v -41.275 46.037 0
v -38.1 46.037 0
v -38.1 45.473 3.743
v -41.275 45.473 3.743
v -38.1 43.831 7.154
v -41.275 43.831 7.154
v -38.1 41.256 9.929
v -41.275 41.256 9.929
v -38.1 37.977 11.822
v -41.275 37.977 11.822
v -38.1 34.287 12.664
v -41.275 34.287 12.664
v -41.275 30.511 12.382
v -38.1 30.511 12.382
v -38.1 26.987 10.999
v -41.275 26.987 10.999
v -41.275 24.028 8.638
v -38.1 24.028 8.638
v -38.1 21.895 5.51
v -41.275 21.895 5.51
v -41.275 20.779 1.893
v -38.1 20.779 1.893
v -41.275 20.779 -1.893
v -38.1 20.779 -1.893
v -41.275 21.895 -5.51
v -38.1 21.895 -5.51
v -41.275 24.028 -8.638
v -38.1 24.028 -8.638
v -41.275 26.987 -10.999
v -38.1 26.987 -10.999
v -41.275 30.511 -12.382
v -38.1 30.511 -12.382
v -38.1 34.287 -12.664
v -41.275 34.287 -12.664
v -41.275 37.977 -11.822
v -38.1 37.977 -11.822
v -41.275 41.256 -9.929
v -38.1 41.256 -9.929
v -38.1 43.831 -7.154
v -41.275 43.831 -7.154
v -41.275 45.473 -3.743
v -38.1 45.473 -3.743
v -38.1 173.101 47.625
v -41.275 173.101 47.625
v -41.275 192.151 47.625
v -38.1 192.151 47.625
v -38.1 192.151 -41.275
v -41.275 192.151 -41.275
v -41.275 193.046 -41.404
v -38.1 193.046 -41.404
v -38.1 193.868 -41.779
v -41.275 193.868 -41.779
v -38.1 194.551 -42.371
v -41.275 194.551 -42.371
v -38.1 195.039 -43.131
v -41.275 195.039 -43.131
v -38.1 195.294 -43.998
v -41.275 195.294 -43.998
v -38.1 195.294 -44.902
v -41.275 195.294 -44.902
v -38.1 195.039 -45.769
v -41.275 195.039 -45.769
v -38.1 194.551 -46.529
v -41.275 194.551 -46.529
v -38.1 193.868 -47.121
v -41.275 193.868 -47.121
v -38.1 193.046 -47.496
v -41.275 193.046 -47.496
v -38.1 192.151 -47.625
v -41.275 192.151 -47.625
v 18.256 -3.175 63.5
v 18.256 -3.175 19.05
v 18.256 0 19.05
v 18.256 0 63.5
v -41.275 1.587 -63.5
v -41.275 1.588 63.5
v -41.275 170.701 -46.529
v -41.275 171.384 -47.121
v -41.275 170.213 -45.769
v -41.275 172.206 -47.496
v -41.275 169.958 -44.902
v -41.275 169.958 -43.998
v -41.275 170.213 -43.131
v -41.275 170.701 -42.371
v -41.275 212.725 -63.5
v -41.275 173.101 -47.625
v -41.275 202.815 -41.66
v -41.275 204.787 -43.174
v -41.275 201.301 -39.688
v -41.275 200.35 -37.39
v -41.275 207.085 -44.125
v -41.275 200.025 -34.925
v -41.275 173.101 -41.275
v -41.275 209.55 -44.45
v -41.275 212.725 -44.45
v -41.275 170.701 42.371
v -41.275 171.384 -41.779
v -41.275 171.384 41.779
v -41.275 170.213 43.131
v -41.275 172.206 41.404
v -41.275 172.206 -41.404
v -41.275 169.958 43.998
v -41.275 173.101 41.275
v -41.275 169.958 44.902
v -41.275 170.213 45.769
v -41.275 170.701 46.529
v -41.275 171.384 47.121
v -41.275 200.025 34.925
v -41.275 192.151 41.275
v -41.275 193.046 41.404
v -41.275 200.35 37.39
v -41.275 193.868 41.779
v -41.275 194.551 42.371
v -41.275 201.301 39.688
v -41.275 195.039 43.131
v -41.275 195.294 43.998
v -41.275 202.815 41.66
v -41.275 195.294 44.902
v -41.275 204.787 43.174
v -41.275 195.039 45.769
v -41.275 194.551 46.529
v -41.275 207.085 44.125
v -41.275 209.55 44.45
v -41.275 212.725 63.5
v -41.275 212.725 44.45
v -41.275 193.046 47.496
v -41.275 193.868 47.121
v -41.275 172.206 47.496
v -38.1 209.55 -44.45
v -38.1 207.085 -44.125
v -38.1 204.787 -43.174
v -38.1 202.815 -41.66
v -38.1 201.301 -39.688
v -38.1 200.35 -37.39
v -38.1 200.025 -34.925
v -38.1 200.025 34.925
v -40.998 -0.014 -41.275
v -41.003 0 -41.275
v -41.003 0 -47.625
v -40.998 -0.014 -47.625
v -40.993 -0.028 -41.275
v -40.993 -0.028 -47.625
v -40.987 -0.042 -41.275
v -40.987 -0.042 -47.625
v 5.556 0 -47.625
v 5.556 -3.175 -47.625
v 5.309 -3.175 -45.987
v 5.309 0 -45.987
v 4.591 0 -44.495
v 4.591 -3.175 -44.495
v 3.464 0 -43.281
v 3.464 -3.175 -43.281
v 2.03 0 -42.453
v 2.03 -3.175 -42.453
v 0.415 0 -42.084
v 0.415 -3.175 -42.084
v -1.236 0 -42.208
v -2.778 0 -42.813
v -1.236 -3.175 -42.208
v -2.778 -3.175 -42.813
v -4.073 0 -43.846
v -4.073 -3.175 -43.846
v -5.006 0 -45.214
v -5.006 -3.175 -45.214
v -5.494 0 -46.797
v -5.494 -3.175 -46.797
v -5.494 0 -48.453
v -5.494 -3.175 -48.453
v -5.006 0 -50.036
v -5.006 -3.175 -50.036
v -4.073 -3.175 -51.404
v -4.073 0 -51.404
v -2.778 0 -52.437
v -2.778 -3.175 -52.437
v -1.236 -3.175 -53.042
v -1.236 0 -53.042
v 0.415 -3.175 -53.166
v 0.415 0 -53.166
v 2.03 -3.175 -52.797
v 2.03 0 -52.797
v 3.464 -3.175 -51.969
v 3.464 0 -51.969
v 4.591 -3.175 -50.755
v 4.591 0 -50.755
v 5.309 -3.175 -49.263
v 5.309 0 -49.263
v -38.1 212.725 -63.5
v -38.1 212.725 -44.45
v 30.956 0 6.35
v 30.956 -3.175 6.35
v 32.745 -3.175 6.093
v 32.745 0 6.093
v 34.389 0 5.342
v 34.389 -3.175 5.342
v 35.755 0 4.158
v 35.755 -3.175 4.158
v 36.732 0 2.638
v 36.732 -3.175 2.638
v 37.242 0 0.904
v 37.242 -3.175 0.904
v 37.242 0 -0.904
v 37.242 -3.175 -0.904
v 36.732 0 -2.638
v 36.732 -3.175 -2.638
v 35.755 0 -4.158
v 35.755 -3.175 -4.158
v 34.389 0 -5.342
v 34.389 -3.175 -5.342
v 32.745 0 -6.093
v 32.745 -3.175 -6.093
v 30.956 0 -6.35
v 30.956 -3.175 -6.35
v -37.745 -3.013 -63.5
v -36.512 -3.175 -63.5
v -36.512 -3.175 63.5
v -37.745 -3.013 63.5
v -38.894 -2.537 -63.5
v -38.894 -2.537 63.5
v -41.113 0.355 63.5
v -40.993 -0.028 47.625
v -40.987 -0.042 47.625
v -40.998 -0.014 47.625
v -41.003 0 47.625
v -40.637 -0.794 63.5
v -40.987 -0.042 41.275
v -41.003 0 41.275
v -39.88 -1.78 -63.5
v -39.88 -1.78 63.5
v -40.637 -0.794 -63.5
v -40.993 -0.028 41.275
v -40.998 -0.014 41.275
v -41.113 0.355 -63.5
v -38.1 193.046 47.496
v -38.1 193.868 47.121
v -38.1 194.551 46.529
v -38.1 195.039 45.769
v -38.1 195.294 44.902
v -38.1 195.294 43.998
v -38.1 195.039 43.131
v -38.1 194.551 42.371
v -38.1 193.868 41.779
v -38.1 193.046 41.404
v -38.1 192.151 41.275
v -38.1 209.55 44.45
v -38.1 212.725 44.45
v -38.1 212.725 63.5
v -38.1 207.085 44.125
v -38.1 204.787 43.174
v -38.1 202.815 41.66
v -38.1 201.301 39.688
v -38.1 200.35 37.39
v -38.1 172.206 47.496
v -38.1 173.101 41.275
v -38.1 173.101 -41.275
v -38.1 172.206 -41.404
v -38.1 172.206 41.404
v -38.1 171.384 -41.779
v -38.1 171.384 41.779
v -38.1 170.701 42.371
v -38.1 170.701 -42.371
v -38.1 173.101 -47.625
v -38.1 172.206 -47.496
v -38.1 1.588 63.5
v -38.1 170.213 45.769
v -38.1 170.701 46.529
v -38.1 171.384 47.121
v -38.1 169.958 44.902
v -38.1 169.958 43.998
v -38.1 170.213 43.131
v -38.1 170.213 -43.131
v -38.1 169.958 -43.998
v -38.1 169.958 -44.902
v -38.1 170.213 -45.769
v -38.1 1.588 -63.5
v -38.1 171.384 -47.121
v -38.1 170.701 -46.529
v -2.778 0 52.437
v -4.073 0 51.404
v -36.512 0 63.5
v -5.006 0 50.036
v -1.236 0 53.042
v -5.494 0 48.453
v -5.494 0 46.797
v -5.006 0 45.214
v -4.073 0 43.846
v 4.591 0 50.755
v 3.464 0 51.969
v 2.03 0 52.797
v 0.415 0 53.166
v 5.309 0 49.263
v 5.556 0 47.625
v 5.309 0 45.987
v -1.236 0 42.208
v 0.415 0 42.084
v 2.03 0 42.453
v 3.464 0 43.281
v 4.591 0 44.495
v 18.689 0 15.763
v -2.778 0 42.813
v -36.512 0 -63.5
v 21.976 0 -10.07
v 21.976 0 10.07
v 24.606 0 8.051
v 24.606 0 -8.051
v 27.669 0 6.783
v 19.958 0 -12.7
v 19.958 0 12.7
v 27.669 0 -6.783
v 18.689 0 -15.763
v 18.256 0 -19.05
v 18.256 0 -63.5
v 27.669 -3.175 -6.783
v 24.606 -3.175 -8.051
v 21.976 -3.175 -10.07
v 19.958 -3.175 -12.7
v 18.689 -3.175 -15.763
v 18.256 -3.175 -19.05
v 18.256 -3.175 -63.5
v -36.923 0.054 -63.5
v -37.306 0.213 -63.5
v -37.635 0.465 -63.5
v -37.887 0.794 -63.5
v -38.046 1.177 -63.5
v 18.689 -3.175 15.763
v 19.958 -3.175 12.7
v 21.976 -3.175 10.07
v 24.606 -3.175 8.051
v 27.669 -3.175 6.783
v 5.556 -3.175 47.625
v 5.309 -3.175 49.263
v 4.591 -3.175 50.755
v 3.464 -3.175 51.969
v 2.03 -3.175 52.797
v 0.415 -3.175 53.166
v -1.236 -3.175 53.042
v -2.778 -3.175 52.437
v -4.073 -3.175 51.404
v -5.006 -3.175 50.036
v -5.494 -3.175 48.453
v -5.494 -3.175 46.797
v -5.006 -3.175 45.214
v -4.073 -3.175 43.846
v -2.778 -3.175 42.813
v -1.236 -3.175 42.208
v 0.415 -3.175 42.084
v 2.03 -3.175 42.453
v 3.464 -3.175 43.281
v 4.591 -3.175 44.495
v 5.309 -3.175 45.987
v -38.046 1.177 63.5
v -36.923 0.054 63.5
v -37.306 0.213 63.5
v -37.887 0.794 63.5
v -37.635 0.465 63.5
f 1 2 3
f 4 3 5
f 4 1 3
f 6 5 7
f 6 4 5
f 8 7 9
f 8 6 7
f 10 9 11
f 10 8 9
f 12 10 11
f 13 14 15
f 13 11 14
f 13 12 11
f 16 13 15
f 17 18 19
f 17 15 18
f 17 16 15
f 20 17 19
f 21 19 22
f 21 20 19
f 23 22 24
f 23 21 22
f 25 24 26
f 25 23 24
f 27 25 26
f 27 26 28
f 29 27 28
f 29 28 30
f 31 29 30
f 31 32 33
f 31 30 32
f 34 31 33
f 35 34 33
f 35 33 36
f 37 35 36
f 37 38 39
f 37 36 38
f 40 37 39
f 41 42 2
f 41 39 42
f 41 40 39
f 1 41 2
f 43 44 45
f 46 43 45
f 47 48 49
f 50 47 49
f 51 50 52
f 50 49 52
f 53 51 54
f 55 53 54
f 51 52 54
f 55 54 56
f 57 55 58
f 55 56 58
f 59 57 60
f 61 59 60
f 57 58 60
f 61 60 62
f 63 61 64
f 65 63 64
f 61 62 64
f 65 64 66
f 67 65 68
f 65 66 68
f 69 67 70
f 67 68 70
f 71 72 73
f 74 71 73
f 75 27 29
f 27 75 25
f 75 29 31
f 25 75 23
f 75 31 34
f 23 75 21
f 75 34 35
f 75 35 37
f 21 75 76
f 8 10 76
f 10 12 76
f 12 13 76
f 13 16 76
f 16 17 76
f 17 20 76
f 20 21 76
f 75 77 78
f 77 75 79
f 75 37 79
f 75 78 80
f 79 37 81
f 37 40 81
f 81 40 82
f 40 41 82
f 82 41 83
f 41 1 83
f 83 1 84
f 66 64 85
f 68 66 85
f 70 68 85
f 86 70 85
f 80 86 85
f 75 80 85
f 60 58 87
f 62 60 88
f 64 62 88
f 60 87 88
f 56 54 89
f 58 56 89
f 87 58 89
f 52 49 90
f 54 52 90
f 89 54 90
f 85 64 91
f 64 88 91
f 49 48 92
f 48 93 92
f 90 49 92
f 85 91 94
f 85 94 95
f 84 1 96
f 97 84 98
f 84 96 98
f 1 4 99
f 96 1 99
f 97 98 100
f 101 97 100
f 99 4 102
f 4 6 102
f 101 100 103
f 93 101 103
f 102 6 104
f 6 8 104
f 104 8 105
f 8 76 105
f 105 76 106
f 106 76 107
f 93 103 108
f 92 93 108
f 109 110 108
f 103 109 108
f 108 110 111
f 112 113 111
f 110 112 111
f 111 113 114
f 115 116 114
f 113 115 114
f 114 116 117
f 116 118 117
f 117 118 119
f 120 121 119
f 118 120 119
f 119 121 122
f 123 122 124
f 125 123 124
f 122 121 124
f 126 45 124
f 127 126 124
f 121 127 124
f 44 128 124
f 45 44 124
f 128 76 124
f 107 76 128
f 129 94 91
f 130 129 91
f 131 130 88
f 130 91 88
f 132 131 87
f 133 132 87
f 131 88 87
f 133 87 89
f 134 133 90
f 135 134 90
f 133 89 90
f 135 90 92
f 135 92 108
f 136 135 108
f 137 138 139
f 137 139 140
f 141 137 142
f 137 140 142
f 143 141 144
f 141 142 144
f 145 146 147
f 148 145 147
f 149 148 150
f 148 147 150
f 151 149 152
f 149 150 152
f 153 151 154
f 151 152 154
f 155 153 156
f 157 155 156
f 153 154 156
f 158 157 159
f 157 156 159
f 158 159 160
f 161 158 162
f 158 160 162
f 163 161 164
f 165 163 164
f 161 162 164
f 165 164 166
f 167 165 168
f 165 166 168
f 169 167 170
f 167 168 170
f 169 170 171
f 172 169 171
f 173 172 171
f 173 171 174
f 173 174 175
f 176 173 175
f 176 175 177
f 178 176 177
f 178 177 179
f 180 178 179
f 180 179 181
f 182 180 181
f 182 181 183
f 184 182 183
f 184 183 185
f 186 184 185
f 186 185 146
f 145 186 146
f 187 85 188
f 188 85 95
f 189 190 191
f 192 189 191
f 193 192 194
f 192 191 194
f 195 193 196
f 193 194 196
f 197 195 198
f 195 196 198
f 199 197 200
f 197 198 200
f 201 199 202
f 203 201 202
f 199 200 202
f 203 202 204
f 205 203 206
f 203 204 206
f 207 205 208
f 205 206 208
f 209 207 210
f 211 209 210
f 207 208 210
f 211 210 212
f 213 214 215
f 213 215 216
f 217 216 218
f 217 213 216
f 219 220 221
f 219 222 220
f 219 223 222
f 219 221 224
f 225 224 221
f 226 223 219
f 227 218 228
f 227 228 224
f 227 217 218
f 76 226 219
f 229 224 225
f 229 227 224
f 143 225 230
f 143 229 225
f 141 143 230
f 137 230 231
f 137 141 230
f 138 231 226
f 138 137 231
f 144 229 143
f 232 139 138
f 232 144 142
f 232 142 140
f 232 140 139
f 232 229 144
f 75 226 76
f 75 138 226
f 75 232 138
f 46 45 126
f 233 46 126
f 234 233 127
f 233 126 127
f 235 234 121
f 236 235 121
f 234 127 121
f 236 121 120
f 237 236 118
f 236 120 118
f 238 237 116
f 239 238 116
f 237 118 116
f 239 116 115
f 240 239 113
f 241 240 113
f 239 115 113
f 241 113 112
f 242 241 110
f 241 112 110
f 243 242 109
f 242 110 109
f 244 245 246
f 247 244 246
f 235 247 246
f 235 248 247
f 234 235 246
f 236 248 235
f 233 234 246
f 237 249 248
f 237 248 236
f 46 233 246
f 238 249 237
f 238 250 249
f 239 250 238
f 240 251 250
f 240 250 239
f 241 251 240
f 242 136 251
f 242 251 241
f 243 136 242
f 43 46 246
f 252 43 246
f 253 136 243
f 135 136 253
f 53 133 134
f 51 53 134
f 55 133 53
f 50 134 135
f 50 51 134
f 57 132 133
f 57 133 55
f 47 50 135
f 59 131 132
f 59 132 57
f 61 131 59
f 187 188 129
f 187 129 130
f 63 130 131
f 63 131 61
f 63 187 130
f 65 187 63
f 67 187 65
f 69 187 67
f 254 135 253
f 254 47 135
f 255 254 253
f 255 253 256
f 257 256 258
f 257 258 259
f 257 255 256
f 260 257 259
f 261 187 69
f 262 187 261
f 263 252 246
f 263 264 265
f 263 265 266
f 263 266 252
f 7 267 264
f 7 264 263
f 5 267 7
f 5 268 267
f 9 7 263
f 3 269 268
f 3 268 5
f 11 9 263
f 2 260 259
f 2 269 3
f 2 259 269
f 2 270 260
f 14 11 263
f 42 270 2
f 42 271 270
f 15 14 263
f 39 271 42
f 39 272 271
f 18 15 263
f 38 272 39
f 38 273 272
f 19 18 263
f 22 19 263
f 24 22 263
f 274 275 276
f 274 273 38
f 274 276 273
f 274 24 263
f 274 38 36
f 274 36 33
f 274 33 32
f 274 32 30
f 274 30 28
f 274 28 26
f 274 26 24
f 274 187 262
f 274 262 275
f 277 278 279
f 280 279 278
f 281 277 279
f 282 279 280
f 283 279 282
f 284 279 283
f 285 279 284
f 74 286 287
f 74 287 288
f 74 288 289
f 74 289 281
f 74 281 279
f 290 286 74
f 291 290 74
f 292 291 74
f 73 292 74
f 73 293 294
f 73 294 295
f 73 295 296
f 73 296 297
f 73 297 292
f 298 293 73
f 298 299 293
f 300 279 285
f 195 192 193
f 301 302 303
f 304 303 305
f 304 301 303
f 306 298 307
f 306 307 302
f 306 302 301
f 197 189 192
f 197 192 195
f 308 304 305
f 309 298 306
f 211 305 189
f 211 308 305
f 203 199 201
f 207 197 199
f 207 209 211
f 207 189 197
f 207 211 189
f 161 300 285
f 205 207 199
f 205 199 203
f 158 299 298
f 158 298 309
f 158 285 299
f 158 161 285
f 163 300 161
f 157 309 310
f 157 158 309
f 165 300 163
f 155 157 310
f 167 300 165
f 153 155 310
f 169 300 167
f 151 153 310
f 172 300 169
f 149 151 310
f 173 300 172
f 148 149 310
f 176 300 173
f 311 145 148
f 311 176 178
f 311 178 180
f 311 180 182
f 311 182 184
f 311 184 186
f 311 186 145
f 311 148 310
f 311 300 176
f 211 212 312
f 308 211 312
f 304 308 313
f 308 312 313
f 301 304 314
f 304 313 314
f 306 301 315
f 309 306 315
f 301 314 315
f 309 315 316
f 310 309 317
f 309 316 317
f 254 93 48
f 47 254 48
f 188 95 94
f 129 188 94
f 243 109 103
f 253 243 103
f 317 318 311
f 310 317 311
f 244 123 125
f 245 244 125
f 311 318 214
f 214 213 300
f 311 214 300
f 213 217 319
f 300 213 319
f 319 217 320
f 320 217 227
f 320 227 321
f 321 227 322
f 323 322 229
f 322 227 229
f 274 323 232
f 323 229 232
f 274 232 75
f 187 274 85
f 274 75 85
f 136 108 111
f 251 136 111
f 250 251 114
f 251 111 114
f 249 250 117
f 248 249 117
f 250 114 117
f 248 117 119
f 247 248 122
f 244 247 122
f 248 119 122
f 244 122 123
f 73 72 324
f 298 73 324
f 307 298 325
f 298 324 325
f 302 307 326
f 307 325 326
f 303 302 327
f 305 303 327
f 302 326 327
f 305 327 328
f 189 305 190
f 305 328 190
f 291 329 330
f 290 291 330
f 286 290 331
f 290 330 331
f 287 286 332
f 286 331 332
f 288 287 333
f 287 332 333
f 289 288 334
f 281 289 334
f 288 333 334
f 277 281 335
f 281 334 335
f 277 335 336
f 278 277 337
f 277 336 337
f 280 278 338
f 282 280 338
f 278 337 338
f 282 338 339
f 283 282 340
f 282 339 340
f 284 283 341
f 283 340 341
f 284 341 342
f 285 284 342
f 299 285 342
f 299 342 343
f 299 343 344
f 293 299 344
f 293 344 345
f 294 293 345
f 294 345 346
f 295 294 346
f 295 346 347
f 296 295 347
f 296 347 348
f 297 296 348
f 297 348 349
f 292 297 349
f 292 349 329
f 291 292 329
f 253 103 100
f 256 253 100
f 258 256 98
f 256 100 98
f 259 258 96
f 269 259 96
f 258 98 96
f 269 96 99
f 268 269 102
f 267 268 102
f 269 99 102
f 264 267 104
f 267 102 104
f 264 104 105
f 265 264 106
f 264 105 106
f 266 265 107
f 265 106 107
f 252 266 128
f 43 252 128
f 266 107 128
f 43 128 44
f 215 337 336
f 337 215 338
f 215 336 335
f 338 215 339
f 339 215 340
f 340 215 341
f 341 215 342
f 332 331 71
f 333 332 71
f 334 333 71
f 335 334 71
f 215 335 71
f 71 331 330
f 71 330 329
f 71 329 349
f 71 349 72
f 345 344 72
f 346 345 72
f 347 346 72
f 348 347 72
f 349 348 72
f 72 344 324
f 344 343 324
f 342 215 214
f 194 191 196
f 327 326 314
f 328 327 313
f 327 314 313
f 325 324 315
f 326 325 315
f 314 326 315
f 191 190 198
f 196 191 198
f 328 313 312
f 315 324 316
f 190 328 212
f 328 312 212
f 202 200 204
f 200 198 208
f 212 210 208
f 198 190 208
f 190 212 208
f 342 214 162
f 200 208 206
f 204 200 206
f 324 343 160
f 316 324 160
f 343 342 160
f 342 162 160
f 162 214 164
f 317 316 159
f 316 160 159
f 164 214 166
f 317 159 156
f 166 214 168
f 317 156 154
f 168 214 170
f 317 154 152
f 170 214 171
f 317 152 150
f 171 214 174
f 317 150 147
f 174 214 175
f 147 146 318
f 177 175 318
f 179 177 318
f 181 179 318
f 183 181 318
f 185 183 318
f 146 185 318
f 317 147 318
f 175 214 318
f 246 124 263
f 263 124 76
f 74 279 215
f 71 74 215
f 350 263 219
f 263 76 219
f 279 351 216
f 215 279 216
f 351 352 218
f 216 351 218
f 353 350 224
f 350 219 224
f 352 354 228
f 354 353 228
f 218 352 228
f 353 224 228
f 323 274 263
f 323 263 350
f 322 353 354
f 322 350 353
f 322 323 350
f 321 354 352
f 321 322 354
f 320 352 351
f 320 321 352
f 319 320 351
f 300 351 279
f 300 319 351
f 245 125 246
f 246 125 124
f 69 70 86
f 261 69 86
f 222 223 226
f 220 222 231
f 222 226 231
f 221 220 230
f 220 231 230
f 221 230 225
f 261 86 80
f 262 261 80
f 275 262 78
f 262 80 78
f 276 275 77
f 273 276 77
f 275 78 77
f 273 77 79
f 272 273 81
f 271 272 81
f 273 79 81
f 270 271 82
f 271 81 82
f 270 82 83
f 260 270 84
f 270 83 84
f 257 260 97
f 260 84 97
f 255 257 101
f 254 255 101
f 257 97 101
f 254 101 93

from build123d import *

# Parameters (mm, degrees)
EXTRUDE1_DEPTH             = 63.5
EXTRUDE1_DEPTH_BACK        = 63.5
CUT_EXTRUDE2_REACH         = 230.798
SKETCH2_R                  = 5.55625
EXTRUDE2_DEPTH             = 3.175
CUT_EXTRUDE3_REACH         = 237.498
SKETCH4_R                  = 12.7
CUT_EXTRUDE4_DEPTH         = 236.497746224
FILLET1_R                  = 9.525
CUT_EXTRUDE7_REACH         = 237.498
FLATTEN_BENDS1_OUTLINE_W   = 4.987278338
FLATTEN_BENDS1_OUTLINE_H   = 127
FLATTEN_BENDS1_DEPTH       = 212.725
FLATTEN_BENDS1_START       = -3.175
FLATTEN_BENDS1_2_OUTLINE_R = 12.7
FLATTEN_BENDS1_2_DEPTH     = 3.175
PROCESS_BENDS1_START       = -252.637278338
PROCESS_BENDS1_OUTLINE_W   = 3.175
PROCESS_BENDS1_OUTLINE_H   = 127
PROCESS_BENDS1_DEPTH       = 211.622562692
PROCESS_BENDS1_START_2     = -41.275
PROCESS_BENDS1_2_OUTLINE_W = 3.175
PROCESS_BENDS1_2_OUTLINE_H = 6.35
PROCESS_BENDS1_2_DEPTH     = 0.287614639
PROCESS_BENDS1_START_3     = -40.987385361
PROCESS_BENDS1_3_OUTLINE_R = 12.7
PROCESS_BENDS1_3_DEPTH     = 2.887385361
PROCESS_BENDS1_4_OUTLINE_R = 12.7
PROCESS_BENDS1_4_DEPTH     = 4.7625
PROCESS_BENDS1_START_4     = -64
PROCESS_BENDS1_5_DEPTH     = 128
PROCESS_BENDS1_START_5     = -47.625
PROCESS_BENDS1_6_DEPTH     = 95.25


with BuildPart() as part:
    # Sketch1 → Extrude1 (new, two sides: drawn at the far end of the back side and taken through both)
    with BuildSketch(Plane.XY.offset(-EXTRUDE1_DEPTH_BACK)):
        with BuildLine():
            Line((18.25625, 0), (-36.5125, 0))
            ThreePointArc((-36.5125, 0), (-37.635032015, 0.464967985), (-38.1, 1.5875))
            Line((-38.1, 1.5875), (-38.1, 212.725))
            Line((-38.1, 212.725), (-41.275, 212.725))
            Line((-41.275, 212.725), (-41.275, 1.5875))
            ThreePointArc((-41.275, 1.5875), (-39.880096045, -1.780096045), (-36.5125, -3.175))
            Line((-36.5125, -3.175), (18.25625, -3.175))
            Line((18.25625, -3.175), (18.25625, 0))
        make_face()
    extrude(amount=EXTRUDE1_DEPTH + EXTRUDE1_DEPTH_BACK)

    # Sketch2 → Cut-Extrude2 (cut, up to next)
    with BuildSketch(Plane.XZ.offset(3.175), mode=Mode.PRIVATE) as cut_extrude2_sk1:
        with Locations((0, -47.625)):
            Circle(SKETCH2_R)
    cut_extrude2_tool1 = extrude(cut_extrude2_sk1.sketch, amount=-CUT_EXTRUDE2_REACH, mode=Mode.PRIVATE) & part.part
    # Sketch2 → Cut-Extrude2 (cut, up to next)
    with BuildSketch(Plane.XZ.offset(3.175), mode=Mode.PRIVATE) as cut_extrude2_sk2:
        with Locations((0, 47.625)):
            Circle(SKETCH2_R)
    cut_extrude2_tool2 = extrude(cut_extrude2_sk2.sketch, amount=-CUT_EXTRUDE2_REACH, mode=Mode.PRIVATE) & part.part
    add(cut_extrude2_tool1.solids().sort_by_distance((0, -3.175, -47.625))[0], mode=Mode.SUBTRACT)
    add(cut_extrude2_tool2.solids().sort_by_distance((0, -3.175, 47.625))[0], mode=Mode.SUBTRACT)

    # Sketch3 → Extrude2 (add)
    with BuildSketch(Plane.XZ.offset(3.175)):
        with BuildLine():
            Line((18.25625, -19.05), (18.25625, 19.05))
            ThreePointArc((18.25625, 19.05), (21.975993879, 10.069743879), (30.95625, 6.35))
            ThreePointArc((30.95625, 6.35), (37.30625, 0), (30.95625, -6.35))
            ThreePointArc((30.95625, -6.35), (21.975993879, -10.069743879), (18.25625, -19.05))
        make_face()
    extrude(amount=-EXTRUDE2_DEPTH)

    # Sketch4 → Cut-Extrude3 (cut, up to next)
    with BuildSketch(Plane.ZY.offset(41.275), mode=Mode.PRIVATE) as cut_extrude3_sk1:
        with Locations((0, 33.3375)):
            Circle(SKETCH4_R)
    cut_extrude3_tool1 = extrude(cut_extrude3_sk1.sketch, amount=-CUT_EXTRUDE3_REACH, mode=Mode.PRIVATE) & part.part
    add(cut_extrude3_tool1.solids().sort_by_distance((-41.275, 33.3375, 0))[0], mode=Mode.SUBTRACT)

    # Sketch5 → Cut-Extrude4 (cut, through all)
    with BuildSketch(Plane.ZY.offset(41.275)):
        Polygon((44.45, 705.492076342), (44.45, 212.725), (44.45, 200.025), (-44.45, 200.025), (-44.45, 212.725), (-44.45, 705.492076342), (-44.45, 1691.026229027), (44.45, 1691.026229027), align=None)
    extrude(amount=-CUT_EXTRUDE4_DEPTH, mode=Mode.SUBTRACT)

    # Fillet1
    fillet1_edges = [part.edges().sort_by_distance(p)[0] for p in [
        (-39.6875, 200.025, 44.45),
        (-39.6875, 200.025, -44.45),
    ]]
    fillet(fillet1_edges, radius=FILLET1_R)

    # Sketch6 → Cut-Extrude7 (cut, up to next)
    with BuildSketch(Plane.ZY.offset(41.275), mode=Mode.PRIVATE) as cut_extrude7_sk1:
        with BuildLine():
            Line((-47.625, 192.151), (-47.625, 173.101))
            ThreePointArc((-47.625, 173.101), (-44.45, 169.926), (-41.275, 173.101))
            Line((-41.275, 173.101), (-41.275, 192.151))
            ThreePointArc((-41.275, 192.151), (-44.45, 195.326), (-47.625, 192.151))
        make_face()
    cut_extrude7_tool1 = extrude(cut_extrude7_sk1.sketch, amount=-CUT_EXTRUDE7_REACH, mode=Mode.PRIVATE) & part.part
    # Sketch6 → Cut-Extrude7 (cut, up to next)
    with BuildSketch(Plane.ZY.offset(41.275), mode=Mode.PRIVATE) as cut_extrude7_sk2:
        with BuildLine():
            Line((47.625, 173.101), (47.625, 192.151))
            ThreePointArc((47.625, 192.151), (44.45, 195.326), (41.275, 192.151))
            Line((41.275, 192.151), (41.275, 173.101))
            ThreePointArc((41.275, 173.101), (44.45, 169.926), (47.625, 173.101))
        make_face()
    cut_extrude7_tool2 = extrude(cut_extrude7_sk2.sketch, amount=-CUT_EXTRUDE7_REACH, mode=Mode.PRIVATE) & part.part
    add(cut_extrude7_tool1.solids().sort_by_distance((-41.275, 182.626, -44.45))[0], mode=Mode.SUBTRACT)
    add(cut_extrude7_tool2.solids().sort_by_distance((-41.275, 182.626, 44.45))[0], mode=Mode.SUBTRACT)

    # Flatten-Bends1: read off the stored shape, not the designer's step
    # Flatten-Bends1 outline → Flatten-Bends1 (cut)
    with BuildSketch(Plane(origin=(0, 0, 0), x_dir=(1, 0, 0), z_dir=(0, 1, 0))):
        with Locations((-39.006139169, 0)):
            Rectangle(FLATTEN_BENDS1_OUTLINE_W, FLATTEN_BENDS1_OUTLINE_H)
    extrude(amount=FLATTEN_BENDS1_DEPTH, mode=Mode.SUBTRACT)

    # Flatten-Bends1 2 outline → Flatten-Bends1 2 (add)
    with BuildSketch(Plane(origin=(0, 0, 0), x_dir=(1, 0, 0), z_dir=(0, 1, 0)).offset(FLATTEN_BENDS1_START)):
        with BuildLine():
            Line((-252.637278338, -44.45), (-252.637278338, -63.5))
            Line((-252.637278338, -63.5), (-36.5125, -63.5))
            Line((-36.5125, -63.5), (-36.5125, 63.5))
            Line((-36.5125, 63.5), (-252.637278338, 63.5))
            Line((-252.637278338, 63.5), (-252.637278338, 44.45))
            Line((-252.637278338, 44.45), (-249.462278338, 44.45))
            ThreePointArc((-249.462278338, 44.45), (-242.727086247, 41.660192091), (-239.937278338, 34.925))
            Line((-239.937278338, 34.925), (-239.937278338, -34.925))
            ThreePointArc((-239.937278338, -34.925), (-242.727086247, -41.660192091), (-249.462278338, -44.45))
            Line((-249.462278338, -44.45), (-252.637278338, -44.45))
        make_face()
        with BuildLine():
            Line((-213.013278338, -47.625), (-232.063278338, -47.625))
            ThreePointArc((-232.063278338, -47.625), (-235.238278338, -44.45), (-232.063278338, -41.275))
            Line((-232.063278338, -41.275), (-213.013278338, -41.275))
            ThreePointArc((-213.013278338, -41.275), (-209.838278338, -44.45), (-213.013278338, -47.625))
        make_face(mode=Mode.SUBTRACT)
        with Locations((-73.249778338, 0)):
            Circle(FLATTEN_BENDS1_2_OUTLINE_R, mode=Mode.SUBTRACT)
        with BuildLine():
            Line((-232.063278338, 47.625), (-213.013278338, 47.625))
            ThreePointArc((-213.013278338, 47.625), (-209.838278338, 44.45), (-213.013278338, 41.275))
            Line((-213.013278338, 41.275), (-232.063278338, 41.275))
            ThreePointArc((-232.063278338, 41.275), (-235.238278338, 44.45), (-232.063278338, 47.625))
        make_face(mode=Mode.SUBTRACT)
    extrude(amount=FLATTEN_BENDS1_2_DEPTH)

    # Process-Bends1: read off the stored shape, not the designer's step
    # Process-Bends1 outline → Process-Bends1 (cut)
    with BuildSketch(Plane.YZ.offset(PROCESS_BENDS1_START)):
        with Locations((-1.5875, 0)):
            Rectangle(PROCESS_BENDS1_OUTLINE_W, PROCESS_BENDS1_OUTLINE_H)
    extrude(amount=PROCESS_BENDS1_DEPTH, mode=Mode.SUBTRACT)

    # Process-Bends1 2 outline → Process-Bends1 2 (cut)
    with BuildSketch(Plane.YZ.offset(PROCESS_BENDS1_START_2)):
        with Locations((-1.5875, -44.45)):
            Rectangle(PROCESS_BENDS1_2_OUTLINE_W, PROCESS_BENDS1_2_OUTLINE_H)
        with Locations((-1.5875, 44.45)):
            Rectangle(PROCESS_BENDS1_2_OUTLINE_W, PROCESS_BENDS1_2_OUTLINE_H)
    extrude(amount=PROCESS_BENDS1_2_DEPTH, mode=Mode.SUBTRACT)

    # Process-Bends1 3 outline → Process-Bends1 3 (add)
    with BuildSketch(Plane.YZ.offset(PROCESS_BENDS1_START_3)):
        with BuildLine():
            Line((212.725, -44.45), (209.55, -44.45))
            ThreePointArc((209.55, -44.45), (202.814807909, -41.660192091), (200.025, -34.925))
            Line((200.025, -34.925), (200.025, 34.925))
            ThreePointArc((200.025, 34.925), (202.814807909, 41.660192091), (209.55, 44.45))
            Line((209.55, 44.45), (212.725, 44.45))
            Line((212.725, 44.45), (212.725, 63.5))
            Line((212.725, 63.5), (0, 63.5))
            Line((0, 63.5), (0, -63.5))
            Line((0, -63.5), (212.725, -63.5))
            Line((212.725, -63.5), (212.725, -44.45))
        make_face()
        with BuildLine():
            Line((192.151, -47.625), (173.101, -47.625))
            ThreePointArc((173.101, -47.625), (169.926, -44.45), (173.101, -41.275))
            Line((173.101, -41.275), (192.151, -41.275))
            ThreePointArc((192.151, -41.275), (195.326, -44.45), (192.151, -47.625))
        make_face(mode=Mode.SUBTRACT)
        with Locations((33.3375, 0)):
            Circle(PROCESS_BENDS1_3_OUTLINE_R, mode=Mode.SUBTRACT)
        with BuildLine():
            Line((192.151, 41.275), (173.101, 41.275))
            ThreePointArc((173.101, 41.275), (169.926, 44.45), (173.101, 47.625))
            Line((173.101, 47.625), (192.151, 47.625))
            ThreePointArc((192.151, 47.625), (195.326, 44.45), (192.151, 41.275))
        make_face(mode=Mode.SUBTRACT)
    extrude(amount=PROCESS_BENDS1_3_DEPTH)

    # Process-Bends1 4 outline → Process-Bends1 4 (add)
    with BuildSketch(Plane.YZ.offset(PROCESS_BENDS1_START_2)):
        with BuildLine():
            Line((212.725, 63.5), (0, 63.5))
            Line((0, 63.5), (0, -63.5))
            Line((0, -63.5), (212.725, -63.5))
            Line((212.725, -63.5), (212.725, -44.45))
            Line((212.725, -44.45), (209.55, -44.45))
            ThreePointArc((209.55, -44.45), (202.814807909, -41.660192091), (200.025, -34.925))
            Line((200.025, -34.925), (200.025, 34.925))
            ThreePointArc((200.025, 34.925), (202.814807909, 41.660192091), (209.55, 44.45))
            Line((209.55, 44.45), (212.725, 44.45))
            Line((212.725, 44.45), (212.725, 63.5))
        make_face()
        with BuildLine():
            Line((192.151, -47.625), (173.101, -47.625))
            ThreePointArc((173.101, -47.625), (169.926, -44.45), (173.101, -41.275))
            Line((173.101, -41.275), (192.151, -41.275))
            ThreePointArc((192.151, -41.275), (195.326, -44.45), (192.151, -47.625))
        make_face(mode=Mode.SUBTRACT)
        with Locations((33.3375, 0)):
            Circle(PROCESS_BENDS1_4_OUTLINE_R, mode=Mode.SUBTRACT)
        with BuildLine():
            Line((192.151, 41.275), (173.101, 41.275))
            ThreePointArc((173.101, 41.275), (169.926, 44.45), (173.101, 47.625))
            Line((173.101, 47.625), (192.151, 47.625))
            ThreePointArc((192.151, 47.625), (195.326, 44.45), (192.151, 41.275))
        make_face(mode=Mode.SUBTRACT)
    extrude(amount=PROCESS_BENDS1_4_DEPTH)

    # Process-Bends1 5 outline → Process-Bends1 5 (cut)
    with BuildSketch(Plane.XY.offset(PROCESS_BENDS1_START_4)):
        with BuildLine():
            Line((-36.5125, 212.725), (-38.1, 212.725))
            Line((-38.1, 212.725), (-38.1, 1.5875))
            ThreePointArc((-38.1, 1.5875), (-37.635032015, 0.464967985), (-36.5125, 0))
            Line((-36.5125, 0), (-36.5125, 212.725))
        make_face()
        with BuildLine():
            Line((-41.275, 1.5875), (-41.275, 0))
            Line((-41.275, 0), (-41.014715646, 0))
            Line((-41.014715646, 0), (-41.014715646, -3.175))
            Line((-41.014715646, -3.175), (-36.5125, -3.175))
            ThreePointArc((-36.5125, -3.175), (-39.880096045, -1.780096045), (-41.275, 1.5875))
        make_face()
    extrude(amount=PROCESS_BENDS1_5_DEPTH, mode=Mode.SUBTRACT)

    # Process-Bends1 6 outline → Process-Bends1 6 (add)
    with BuildSketch(Plane.XY.offset(PROCESS_BENDS1_START_5)):
        with BuildLine():
            Line((-40.987385361, 0), (-41.00262806, 0))
            ThreePointArc((-41.00262806, 0), (-40.995057012, -0.021253828), (-40.987385361, -0.04247155))
            Line((-40.987385361, -0.04247155), (-40.987385361, 0))
        make_face()
    extrude(amount=PROCESS_BENDS1_6_DEPTH)


solid = part.part
